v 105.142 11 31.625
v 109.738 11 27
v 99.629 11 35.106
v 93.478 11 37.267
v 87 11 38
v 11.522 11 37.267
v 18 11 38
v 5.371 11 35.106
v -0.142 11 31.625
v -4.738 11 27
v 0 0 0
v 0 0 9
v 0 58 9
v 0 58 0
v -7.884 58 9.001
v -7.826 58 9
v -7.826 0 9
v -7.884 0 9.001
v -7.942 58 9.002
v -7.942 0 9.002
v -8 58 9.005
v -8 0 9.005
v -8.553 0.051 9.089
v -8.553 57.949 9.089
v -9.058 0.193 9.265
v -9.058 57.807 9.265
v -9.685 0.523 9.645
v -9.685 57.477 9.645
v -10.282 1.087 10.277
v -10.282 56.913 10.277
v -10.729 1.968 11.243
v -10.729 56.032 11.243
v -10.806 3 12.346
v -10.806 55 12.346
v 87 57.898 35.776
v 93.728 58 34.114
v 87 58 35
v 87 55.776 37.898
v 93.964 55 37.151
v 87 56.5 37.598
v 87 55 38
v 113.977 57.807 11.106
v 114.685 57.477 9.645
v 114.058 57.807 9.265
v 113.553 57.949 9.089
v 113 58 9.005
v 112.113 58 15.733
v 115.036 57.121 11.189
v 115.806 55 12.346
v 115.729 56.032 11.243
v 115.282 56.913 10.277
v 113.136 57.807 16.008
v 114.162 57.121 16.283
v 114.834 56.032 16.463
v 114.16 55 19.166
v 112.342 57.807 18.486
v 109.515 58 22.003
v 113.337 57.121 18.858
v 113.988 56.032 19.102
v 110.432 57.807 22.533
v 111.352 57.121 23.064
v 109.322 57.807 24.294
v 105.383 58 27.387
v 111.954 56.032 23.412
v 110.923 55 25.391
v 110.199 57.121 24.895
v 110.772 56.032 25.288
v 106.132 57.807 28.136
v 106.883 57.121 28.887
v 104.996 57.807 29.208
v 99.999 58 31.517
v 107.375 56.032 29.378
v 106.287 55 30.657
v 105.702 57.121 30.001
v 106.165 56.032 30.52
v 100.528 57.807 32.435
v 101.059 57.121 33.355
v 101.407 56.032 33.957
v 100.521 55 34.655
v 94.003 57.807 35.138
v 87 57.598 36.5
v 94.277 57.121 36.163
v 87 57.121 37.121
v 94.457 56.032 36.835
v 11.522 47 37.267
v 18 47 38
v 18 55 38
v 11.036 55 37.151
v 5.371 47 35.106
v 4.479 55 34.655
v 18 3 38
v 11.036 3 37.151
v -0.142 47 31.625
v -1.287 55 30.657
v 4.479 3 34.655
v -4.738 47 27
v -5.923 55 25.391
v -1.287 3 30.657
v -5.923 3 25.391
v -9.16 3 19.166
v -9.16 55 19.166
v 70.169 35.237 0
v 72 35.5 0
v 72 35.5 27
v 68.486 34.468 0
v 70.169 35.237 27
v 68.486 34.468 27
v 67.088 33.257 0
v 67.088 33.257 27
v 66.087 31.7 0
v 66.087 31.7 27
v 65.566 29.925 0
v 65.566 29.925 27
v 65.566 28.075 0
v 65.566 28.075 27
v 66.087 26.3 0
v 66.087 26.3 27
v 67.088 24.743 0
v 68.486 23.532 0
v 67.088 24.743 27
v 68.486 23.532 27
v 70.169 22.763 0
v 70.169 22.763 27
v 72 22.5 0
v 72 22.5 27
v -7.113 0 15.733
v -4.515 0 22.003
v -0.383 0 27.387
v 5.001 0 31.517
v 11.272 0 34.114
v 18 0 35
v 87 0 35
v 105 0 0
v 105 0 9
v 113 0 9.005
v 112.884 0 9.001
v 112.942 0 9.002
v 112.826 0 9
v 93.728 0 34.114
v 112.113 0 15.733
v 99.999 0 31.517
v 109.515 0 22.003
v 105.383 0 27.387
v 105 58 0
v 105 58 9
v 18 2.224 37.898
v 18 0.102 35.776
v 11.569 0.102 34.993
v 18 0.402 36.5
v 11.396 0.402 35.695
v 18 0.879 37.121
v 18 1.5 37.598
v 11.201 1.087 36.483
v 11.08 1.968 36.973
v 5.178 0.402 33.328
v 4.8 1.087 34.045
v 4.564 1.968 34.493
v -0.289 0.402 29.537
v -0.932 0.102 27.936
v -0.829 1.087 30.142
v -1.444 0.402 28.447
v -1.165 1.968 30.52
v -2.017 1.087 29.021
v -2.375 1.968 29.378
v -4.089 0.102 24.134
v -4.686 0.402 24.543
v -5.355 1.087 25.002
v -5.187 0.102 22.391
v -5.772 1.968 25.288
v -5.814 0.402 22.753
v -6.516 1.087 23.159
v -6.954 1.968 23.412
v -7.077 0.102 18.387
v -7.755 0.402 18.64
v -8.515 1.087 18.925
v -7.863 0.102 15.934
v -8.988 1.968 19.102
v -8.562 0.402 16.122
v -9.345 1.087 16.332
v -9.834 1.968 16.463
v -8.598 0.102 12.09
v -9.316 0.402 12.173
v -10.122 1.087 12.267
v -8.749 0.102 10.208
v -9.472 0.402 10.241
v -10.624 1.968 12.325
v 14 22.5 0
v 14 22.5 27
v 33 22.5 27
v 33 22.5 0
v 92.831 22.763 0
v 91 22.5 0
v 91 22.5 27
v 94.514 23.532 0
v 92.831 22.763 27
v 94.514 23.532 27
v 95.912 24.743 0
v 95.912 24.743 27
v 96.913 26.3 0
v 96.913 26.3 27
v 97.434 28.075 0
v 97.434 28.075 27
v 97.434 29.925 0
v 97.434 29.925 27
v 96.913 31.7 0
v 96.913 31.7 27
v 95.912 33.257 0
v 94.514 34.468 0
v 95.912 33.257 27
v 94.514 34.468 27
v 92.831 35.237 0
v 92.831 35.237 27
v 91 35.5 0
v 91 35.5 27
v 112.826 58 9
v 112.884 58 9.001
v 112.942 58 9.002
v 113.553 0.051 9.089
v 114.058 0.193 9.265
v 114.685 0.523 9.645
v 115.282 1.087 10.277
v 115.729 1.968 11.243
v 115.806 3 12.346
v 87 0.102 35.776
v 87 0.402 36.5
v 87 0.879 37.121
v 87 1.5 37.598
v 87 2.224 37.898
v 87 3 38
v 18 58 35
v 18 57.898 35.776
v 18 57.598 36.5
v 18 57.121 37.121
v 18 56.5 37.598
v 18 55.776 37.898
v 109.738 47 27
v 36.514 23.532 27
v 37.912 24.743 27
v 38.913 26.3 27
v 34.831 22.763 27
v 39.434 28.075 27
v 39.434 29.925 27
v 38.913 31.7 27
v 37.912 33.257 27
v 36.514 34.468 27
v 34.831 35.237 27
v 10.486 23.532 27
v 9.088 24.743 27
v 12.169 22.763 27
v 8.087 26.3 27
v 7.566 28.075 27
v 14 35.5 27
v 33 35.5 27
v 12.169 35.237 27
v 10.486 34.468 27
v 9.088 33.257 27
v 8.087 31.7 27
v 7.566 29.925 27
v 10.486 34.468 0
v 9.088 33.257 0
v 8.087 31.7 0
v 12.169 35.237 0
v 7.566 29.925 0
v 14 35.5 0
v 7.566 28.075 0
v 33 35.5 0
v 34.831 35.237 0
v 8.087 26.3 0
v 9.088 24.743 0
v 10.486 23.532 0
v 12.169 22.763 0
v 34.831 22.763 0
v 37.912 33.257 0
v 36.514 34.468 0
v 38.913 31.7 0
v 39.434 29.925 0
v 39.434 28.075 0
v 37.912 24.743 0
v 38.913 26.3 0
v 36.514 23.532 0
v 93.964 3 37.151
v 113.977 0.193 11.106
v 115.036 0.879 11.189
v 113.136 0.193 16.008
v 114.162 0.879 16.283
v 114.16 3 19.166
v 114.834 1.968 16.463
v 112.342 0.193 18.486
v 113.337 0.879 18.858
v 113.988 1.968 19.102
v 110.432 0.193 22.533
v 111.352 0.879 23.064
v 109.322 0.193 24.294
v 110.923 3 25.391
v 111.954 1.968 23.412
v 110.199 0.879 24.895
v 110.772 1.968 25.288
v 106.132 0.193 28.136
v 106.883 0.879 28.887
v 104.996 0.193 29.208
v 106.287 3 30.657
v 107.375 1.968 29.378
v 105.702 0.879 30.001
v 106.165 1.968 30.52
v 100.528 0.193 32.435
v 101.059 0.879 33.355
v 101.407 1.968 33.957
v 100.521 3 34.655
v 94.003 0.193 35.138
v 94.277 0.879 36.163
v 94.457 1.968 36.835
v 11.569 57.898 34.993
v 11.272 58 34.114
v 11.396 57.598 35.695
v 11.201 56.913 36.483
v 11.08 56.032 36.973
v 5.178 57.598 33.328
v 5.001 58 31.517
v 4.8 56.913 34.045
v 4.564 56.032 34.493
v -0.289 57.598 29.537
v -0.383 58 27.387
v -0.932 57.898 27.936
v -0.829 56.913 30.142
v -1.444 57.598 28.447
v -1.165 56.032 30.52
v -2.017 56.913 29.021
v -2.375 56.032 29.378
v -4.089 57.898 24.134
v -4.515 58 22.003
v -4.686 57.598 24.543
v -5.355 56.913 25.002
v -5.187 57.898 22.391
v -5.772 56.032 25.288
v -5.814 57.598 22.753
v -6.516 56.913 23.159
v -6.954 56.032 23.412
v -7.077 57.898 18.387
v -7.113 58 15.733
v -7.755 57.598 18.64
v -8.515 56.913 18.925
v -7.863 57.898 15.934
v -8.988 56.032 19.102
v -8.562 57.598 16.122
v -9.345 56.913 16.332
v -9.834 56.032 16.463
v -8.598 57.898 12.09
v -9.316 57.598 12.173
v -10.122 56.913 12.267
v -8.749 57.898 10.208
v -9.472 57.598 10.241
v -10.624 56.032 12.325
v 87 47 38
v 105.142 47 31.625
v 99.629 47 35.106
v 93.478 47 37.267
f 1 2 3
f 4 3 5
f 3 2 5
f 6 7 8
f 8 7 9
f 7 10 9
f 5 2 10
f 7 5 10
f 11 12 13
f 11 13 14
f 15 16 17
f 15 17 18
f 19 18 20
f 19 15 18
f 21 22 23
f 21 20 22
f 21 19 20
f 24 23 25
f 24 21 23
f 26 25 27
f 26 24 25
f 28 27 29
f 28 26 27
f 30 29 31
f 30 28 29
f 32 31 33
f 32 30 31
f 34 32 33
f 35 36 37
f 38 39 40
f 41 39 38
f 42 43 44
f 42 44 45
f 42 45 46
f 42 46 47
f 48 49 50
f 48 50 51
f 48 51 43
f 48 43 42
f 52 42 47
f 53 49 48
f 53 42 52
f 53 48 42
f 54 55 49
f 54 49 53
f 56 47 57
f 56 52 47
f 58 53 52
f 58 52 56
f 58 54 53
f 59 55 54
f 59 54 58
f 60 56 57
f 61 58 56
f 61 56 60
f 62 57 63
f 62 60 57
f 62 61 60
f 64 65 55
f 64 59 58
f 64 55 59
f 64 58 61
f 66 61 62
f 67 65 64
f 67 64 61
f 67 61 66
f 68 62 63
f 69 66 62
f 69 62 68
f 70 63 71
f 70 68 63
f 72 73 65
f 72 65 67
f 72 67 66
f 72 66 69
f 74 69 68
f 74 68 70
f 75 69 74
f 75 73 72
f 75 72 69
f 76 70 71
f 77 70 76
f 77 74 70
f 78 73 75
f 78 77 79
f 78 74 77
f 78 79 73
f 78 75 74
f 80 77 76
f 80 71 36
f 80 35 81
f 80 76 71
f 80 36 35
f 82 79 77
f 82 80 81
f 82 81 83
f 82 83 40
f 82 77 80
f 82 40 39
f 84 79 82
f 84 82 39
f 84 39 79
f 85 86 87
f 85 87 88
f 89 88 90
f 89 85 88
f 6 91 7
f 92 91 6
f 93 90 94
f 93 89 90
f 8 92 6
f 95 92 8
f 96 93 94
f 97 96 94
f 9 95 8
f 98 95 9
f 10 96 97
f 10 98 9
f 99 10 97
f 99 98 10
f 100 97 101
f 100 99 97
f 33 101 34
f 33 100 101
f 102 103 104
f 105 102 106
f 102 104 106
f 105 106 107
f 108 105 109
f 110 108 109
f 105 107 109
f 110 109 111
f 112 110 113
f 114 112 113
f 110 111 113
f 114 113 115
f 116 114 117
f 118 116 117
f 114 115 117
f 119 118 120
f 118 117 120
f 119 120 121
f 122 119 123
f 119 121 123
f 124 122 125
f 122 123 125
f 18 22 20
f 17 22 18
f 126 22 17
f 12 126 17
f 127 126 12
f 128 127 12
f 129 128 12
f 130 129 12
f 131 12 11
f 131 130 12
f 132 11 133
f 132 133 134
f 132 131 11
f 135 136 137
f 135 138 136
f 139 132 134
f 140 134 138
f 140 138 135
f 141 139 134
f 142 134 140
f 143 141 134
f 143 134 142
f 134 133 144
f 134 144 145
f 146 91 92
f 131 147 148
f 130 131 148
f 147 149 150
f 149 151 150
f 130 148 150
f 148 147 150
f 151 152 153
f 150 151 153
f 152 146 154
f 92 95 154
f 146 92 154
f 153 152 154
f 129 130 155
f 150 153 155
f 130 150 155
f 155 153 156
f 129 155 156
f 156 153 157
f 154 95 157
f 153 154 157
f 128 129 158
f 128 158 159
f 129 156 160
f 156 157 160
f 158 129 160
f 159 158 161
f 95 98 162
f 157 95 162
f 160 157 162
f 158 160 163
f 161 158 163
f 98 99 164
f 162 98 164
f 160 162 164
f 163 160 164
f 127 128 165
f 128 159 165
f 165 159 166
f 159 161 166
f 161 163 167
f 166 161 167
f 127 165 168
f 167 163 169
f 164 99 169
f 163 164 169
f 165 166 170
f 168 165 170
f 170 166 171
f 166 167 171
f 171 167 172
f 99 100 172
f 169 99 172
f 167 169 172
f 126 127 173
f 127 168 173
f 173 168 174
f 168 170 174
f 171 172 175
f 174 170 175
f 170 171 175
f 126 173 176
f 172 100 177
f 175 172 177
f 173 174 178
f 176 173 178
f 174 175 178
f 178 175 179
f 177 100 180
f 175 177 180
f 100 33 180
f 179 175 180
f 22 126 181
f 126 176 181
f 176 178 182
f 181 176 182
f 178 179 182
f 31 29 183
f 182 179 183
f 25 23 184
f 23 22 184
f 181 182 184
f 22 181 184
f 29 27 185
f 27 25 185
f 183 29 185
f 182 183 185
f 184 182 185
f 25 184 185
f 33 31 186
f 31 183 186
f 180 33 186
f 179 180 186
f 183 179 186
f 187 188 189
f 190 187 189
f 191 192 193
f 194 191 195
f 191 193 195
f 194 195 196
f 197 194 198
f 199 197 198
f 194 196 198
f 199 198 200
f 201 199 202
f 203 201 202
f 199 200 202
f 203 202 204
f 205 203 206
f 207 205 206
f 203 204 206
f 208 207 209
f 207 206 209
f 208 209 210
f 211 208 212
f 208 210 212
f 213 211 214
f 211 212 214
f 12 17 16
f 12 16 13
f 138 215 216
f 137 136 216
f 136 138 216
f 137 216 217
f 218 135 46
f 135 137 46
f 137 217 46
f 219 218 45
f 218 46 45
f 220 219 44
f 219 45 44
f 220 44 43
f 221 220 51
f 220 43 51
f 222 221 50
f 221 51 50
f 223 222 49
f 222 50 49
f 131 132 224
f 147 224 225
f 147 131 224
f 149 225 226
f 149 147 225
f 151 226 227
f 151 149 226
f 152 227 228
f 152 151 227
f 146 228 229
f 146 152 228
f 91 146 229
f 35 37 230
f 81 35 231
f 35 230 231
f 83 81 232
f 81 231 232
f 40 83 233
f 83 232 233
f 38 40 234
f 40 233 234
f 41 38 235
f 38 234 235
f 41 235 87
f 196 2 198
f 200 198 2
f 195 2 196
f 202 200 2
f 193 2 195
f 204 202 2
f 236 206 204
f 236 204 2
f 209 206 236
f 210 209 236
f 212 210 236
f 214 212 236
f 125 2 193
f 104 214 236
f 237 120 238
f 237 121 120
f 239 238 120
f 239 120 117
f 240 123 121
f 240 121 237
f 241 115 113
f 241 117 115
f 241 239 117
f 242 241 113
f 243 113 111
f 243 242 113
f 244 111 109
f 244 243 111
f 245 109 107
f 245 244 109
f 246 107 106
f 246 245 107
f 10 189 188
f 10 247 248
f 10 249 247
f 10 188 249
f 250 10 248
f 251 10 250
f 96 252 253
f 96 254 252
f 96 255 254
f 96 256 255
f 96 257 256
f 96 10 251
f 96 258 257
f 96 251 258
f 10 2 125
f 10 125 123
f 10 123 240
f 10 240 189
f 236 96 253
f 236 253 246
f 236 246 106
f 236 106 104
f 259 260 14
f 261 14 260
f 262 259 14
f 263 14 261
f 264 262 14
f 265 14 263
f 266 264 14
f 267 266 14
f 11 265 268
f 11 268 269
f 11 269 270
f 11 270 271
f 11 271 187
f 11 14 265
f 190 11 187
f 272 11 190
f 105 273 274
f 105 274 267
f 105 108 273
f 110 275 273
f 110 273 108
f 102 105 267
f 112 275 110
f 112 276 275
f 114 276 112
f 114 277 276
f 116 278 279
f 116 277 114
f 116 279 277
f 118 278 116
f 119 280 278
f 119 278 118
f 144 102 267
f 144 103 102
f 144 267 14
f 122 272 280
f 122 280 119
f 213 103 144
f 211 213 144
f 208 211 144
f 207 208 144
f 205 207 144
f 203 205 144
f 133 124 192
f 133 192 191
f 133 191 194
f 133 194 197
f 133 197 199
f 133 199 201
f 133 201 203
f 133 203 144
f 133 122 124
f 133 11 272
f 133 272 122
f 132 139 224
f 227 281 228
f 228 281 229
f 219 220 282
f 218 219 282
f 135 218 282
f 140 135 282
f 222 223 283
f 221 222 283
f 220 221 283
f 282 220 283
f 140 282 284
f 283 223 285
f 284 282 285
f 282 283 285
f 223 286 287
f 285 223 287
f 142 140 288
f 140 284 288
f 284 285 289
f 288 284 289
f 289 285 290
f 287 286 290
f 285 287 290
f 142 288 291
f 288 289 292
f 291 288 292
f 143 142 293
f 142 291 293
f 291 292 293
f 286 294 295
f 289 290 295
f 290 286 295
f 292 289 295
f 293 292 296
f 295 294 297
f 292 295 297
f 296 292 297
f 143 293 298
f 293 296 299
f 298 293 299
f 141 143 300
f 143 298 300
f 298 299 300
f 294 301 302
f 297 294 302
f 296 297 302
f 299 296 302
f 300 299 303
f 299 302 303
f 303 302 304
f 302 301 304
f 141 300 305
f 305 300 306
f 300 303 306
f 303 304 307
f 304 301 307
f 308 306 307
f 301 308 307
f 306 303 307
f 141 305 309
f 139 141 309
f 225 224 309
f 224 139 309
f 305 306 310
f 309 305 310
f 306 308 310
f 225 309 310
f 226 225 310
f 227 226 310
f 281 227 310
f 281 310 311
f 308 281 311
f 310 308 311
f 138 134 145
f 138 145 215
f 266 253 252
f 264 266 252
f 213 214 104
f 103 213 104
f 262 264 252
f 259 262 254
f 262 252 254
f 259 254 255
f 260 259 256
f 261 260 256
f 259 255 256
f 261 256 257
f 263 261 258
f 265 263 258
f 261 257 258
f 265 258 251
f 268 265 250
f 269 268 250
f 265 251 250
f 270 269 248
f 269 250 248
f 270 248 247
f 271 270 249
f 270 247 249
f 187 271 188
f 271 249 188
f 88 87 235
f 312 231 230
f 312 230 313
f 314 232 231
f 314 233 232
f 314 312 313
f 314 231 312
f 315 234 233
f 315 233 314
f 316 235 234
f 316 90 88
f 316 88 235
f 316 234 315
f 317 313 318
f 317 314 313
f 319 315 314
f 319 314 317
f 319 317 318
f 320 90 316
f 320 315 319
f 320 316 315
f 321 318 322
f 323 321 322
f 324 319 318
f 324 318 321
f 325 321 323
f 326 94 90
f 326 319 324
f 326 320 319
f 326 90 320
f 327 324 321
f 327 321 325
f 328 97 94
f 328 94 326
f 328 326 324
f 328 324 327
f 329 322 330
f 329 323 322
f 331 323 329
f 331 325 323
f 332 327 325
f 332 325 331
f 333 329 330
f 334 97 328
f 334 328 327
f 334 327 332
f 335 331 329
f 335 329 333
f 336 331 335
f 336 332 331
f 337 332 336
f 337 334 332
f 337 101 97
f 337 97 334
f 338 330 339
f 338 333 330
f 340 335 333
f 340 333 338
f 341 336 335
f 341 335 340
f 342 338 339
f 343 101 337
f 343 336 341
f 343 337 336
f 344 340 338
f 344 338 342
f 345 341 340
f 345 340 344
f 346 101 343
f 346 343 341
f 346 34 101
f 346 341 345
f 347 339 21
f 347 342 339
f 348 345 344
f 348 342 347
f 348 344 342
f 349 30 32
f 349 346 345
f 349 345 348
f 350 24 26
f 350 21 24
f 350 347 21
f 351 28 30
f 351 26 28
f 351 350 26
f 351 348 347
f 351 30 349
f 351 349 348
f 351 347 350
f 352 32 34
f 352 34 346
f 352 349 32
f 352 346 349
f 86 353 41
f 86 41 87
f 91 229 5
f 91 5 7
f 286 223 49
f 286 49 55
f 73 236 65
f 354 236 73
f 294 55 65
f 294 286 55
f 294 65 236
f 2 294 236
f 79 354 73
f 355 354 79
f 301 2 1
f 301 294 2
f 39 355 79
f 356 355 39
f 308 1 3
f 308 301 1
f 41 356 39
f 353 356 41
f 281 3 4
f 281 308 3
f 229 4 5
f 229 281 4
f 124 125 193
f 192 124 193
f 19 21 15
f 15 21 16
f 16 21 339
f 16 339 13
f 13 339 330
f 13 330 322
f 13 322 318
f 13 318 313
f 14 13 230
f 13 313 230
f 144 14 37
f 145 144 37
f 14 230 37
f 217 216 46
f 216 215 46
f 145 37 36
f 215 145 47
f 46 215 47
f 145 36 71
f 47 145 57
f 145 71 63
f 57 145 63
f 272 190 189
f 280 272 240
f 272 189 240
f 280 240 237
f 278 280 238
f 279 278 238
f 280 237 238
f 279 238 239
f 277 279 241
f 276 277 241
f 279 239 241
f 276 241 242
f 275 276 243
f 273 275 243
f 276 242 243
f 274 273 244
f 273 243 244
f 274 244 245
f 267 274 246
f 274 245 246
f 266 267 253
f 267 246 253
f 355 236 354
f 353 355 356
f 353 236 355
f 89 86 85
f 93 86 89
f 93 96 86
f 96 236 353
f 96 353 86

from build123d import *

# Parameters (mm, degrees)
F1_DEPTH = 58
F3_W     = 36
F3_H     = 11
F4_DEPTH = 127
F6_DEPTH = 38
F7_R     = 3


with BuildPart() as f1:
    # F0 (on Front) → F1 (new body)
    with BuildSketch(Plane.XZ):
        with BuildLine():
            Line((0, 9), (0, 0))
            Line((0, 0), (105, 0))
            Line((105, 0), (105, 9))
            Line((105, 9), (116, 9))
            ThreePointArc((116, 9), (107.506097, 29.506097), (87, 38))
            Line((87, 38), (18, 38))
            ThreePointArc((18, 38), (-2.506097, 29.506097), (-11, 9))
            Line((-11, 9), (0, 9))
        make_face()
    extrude(amount=-F1_DEPTH)

    # F3 (on offset) → F4 (cut)
    with BuildSketch(Plane.YZ.offset(-11)):
        with Locations((29, 32.5)):
            Rectangle(F3_W, F3_H)
    extrude(amount=F4_DEPTH, mode=Mode.SUBTRACT)

    # F5 (on face) → F6 (cut)
    with BuildSketch(Plane.XY.offset(27)):
        with BuildLine():
            Line((33, 35.5), (14, 35.5))
            ThreePointArc((14, 35.5), (7.5, 29), (14, 22.5))
            Line((14, 22.5), (33, 22.5))
            ThreePointArc((33, 22.5), (39.5, 29), (33, 35.5))
        make_face()
        with BuildLine():
            Line((72, 22.5), (91, 22.5))
            ThreePointArc((91, 22.5), (97.5, 29), (91, 35.5))
            Line((91, 35.5), (72, 35.5))
            ThreePointArc((72, 35.5), (65.5, 29), (72, 22.5))
        make_face()
    extrude(amount=-F6_DEPTH, mode=Mode.SUBTRACT)

    # F7
    f7_edges = [f1.edges().sort_by_distance(p)[0] for p in [
        (107.506097, 0, 29.506097),
        (116, 29, 9),
        (107.506097, 58, 29.506097),
        (-11, 29, 9),
    ]]
    fillet(f7_edges, radius=F7_R)


solid = f1.part
